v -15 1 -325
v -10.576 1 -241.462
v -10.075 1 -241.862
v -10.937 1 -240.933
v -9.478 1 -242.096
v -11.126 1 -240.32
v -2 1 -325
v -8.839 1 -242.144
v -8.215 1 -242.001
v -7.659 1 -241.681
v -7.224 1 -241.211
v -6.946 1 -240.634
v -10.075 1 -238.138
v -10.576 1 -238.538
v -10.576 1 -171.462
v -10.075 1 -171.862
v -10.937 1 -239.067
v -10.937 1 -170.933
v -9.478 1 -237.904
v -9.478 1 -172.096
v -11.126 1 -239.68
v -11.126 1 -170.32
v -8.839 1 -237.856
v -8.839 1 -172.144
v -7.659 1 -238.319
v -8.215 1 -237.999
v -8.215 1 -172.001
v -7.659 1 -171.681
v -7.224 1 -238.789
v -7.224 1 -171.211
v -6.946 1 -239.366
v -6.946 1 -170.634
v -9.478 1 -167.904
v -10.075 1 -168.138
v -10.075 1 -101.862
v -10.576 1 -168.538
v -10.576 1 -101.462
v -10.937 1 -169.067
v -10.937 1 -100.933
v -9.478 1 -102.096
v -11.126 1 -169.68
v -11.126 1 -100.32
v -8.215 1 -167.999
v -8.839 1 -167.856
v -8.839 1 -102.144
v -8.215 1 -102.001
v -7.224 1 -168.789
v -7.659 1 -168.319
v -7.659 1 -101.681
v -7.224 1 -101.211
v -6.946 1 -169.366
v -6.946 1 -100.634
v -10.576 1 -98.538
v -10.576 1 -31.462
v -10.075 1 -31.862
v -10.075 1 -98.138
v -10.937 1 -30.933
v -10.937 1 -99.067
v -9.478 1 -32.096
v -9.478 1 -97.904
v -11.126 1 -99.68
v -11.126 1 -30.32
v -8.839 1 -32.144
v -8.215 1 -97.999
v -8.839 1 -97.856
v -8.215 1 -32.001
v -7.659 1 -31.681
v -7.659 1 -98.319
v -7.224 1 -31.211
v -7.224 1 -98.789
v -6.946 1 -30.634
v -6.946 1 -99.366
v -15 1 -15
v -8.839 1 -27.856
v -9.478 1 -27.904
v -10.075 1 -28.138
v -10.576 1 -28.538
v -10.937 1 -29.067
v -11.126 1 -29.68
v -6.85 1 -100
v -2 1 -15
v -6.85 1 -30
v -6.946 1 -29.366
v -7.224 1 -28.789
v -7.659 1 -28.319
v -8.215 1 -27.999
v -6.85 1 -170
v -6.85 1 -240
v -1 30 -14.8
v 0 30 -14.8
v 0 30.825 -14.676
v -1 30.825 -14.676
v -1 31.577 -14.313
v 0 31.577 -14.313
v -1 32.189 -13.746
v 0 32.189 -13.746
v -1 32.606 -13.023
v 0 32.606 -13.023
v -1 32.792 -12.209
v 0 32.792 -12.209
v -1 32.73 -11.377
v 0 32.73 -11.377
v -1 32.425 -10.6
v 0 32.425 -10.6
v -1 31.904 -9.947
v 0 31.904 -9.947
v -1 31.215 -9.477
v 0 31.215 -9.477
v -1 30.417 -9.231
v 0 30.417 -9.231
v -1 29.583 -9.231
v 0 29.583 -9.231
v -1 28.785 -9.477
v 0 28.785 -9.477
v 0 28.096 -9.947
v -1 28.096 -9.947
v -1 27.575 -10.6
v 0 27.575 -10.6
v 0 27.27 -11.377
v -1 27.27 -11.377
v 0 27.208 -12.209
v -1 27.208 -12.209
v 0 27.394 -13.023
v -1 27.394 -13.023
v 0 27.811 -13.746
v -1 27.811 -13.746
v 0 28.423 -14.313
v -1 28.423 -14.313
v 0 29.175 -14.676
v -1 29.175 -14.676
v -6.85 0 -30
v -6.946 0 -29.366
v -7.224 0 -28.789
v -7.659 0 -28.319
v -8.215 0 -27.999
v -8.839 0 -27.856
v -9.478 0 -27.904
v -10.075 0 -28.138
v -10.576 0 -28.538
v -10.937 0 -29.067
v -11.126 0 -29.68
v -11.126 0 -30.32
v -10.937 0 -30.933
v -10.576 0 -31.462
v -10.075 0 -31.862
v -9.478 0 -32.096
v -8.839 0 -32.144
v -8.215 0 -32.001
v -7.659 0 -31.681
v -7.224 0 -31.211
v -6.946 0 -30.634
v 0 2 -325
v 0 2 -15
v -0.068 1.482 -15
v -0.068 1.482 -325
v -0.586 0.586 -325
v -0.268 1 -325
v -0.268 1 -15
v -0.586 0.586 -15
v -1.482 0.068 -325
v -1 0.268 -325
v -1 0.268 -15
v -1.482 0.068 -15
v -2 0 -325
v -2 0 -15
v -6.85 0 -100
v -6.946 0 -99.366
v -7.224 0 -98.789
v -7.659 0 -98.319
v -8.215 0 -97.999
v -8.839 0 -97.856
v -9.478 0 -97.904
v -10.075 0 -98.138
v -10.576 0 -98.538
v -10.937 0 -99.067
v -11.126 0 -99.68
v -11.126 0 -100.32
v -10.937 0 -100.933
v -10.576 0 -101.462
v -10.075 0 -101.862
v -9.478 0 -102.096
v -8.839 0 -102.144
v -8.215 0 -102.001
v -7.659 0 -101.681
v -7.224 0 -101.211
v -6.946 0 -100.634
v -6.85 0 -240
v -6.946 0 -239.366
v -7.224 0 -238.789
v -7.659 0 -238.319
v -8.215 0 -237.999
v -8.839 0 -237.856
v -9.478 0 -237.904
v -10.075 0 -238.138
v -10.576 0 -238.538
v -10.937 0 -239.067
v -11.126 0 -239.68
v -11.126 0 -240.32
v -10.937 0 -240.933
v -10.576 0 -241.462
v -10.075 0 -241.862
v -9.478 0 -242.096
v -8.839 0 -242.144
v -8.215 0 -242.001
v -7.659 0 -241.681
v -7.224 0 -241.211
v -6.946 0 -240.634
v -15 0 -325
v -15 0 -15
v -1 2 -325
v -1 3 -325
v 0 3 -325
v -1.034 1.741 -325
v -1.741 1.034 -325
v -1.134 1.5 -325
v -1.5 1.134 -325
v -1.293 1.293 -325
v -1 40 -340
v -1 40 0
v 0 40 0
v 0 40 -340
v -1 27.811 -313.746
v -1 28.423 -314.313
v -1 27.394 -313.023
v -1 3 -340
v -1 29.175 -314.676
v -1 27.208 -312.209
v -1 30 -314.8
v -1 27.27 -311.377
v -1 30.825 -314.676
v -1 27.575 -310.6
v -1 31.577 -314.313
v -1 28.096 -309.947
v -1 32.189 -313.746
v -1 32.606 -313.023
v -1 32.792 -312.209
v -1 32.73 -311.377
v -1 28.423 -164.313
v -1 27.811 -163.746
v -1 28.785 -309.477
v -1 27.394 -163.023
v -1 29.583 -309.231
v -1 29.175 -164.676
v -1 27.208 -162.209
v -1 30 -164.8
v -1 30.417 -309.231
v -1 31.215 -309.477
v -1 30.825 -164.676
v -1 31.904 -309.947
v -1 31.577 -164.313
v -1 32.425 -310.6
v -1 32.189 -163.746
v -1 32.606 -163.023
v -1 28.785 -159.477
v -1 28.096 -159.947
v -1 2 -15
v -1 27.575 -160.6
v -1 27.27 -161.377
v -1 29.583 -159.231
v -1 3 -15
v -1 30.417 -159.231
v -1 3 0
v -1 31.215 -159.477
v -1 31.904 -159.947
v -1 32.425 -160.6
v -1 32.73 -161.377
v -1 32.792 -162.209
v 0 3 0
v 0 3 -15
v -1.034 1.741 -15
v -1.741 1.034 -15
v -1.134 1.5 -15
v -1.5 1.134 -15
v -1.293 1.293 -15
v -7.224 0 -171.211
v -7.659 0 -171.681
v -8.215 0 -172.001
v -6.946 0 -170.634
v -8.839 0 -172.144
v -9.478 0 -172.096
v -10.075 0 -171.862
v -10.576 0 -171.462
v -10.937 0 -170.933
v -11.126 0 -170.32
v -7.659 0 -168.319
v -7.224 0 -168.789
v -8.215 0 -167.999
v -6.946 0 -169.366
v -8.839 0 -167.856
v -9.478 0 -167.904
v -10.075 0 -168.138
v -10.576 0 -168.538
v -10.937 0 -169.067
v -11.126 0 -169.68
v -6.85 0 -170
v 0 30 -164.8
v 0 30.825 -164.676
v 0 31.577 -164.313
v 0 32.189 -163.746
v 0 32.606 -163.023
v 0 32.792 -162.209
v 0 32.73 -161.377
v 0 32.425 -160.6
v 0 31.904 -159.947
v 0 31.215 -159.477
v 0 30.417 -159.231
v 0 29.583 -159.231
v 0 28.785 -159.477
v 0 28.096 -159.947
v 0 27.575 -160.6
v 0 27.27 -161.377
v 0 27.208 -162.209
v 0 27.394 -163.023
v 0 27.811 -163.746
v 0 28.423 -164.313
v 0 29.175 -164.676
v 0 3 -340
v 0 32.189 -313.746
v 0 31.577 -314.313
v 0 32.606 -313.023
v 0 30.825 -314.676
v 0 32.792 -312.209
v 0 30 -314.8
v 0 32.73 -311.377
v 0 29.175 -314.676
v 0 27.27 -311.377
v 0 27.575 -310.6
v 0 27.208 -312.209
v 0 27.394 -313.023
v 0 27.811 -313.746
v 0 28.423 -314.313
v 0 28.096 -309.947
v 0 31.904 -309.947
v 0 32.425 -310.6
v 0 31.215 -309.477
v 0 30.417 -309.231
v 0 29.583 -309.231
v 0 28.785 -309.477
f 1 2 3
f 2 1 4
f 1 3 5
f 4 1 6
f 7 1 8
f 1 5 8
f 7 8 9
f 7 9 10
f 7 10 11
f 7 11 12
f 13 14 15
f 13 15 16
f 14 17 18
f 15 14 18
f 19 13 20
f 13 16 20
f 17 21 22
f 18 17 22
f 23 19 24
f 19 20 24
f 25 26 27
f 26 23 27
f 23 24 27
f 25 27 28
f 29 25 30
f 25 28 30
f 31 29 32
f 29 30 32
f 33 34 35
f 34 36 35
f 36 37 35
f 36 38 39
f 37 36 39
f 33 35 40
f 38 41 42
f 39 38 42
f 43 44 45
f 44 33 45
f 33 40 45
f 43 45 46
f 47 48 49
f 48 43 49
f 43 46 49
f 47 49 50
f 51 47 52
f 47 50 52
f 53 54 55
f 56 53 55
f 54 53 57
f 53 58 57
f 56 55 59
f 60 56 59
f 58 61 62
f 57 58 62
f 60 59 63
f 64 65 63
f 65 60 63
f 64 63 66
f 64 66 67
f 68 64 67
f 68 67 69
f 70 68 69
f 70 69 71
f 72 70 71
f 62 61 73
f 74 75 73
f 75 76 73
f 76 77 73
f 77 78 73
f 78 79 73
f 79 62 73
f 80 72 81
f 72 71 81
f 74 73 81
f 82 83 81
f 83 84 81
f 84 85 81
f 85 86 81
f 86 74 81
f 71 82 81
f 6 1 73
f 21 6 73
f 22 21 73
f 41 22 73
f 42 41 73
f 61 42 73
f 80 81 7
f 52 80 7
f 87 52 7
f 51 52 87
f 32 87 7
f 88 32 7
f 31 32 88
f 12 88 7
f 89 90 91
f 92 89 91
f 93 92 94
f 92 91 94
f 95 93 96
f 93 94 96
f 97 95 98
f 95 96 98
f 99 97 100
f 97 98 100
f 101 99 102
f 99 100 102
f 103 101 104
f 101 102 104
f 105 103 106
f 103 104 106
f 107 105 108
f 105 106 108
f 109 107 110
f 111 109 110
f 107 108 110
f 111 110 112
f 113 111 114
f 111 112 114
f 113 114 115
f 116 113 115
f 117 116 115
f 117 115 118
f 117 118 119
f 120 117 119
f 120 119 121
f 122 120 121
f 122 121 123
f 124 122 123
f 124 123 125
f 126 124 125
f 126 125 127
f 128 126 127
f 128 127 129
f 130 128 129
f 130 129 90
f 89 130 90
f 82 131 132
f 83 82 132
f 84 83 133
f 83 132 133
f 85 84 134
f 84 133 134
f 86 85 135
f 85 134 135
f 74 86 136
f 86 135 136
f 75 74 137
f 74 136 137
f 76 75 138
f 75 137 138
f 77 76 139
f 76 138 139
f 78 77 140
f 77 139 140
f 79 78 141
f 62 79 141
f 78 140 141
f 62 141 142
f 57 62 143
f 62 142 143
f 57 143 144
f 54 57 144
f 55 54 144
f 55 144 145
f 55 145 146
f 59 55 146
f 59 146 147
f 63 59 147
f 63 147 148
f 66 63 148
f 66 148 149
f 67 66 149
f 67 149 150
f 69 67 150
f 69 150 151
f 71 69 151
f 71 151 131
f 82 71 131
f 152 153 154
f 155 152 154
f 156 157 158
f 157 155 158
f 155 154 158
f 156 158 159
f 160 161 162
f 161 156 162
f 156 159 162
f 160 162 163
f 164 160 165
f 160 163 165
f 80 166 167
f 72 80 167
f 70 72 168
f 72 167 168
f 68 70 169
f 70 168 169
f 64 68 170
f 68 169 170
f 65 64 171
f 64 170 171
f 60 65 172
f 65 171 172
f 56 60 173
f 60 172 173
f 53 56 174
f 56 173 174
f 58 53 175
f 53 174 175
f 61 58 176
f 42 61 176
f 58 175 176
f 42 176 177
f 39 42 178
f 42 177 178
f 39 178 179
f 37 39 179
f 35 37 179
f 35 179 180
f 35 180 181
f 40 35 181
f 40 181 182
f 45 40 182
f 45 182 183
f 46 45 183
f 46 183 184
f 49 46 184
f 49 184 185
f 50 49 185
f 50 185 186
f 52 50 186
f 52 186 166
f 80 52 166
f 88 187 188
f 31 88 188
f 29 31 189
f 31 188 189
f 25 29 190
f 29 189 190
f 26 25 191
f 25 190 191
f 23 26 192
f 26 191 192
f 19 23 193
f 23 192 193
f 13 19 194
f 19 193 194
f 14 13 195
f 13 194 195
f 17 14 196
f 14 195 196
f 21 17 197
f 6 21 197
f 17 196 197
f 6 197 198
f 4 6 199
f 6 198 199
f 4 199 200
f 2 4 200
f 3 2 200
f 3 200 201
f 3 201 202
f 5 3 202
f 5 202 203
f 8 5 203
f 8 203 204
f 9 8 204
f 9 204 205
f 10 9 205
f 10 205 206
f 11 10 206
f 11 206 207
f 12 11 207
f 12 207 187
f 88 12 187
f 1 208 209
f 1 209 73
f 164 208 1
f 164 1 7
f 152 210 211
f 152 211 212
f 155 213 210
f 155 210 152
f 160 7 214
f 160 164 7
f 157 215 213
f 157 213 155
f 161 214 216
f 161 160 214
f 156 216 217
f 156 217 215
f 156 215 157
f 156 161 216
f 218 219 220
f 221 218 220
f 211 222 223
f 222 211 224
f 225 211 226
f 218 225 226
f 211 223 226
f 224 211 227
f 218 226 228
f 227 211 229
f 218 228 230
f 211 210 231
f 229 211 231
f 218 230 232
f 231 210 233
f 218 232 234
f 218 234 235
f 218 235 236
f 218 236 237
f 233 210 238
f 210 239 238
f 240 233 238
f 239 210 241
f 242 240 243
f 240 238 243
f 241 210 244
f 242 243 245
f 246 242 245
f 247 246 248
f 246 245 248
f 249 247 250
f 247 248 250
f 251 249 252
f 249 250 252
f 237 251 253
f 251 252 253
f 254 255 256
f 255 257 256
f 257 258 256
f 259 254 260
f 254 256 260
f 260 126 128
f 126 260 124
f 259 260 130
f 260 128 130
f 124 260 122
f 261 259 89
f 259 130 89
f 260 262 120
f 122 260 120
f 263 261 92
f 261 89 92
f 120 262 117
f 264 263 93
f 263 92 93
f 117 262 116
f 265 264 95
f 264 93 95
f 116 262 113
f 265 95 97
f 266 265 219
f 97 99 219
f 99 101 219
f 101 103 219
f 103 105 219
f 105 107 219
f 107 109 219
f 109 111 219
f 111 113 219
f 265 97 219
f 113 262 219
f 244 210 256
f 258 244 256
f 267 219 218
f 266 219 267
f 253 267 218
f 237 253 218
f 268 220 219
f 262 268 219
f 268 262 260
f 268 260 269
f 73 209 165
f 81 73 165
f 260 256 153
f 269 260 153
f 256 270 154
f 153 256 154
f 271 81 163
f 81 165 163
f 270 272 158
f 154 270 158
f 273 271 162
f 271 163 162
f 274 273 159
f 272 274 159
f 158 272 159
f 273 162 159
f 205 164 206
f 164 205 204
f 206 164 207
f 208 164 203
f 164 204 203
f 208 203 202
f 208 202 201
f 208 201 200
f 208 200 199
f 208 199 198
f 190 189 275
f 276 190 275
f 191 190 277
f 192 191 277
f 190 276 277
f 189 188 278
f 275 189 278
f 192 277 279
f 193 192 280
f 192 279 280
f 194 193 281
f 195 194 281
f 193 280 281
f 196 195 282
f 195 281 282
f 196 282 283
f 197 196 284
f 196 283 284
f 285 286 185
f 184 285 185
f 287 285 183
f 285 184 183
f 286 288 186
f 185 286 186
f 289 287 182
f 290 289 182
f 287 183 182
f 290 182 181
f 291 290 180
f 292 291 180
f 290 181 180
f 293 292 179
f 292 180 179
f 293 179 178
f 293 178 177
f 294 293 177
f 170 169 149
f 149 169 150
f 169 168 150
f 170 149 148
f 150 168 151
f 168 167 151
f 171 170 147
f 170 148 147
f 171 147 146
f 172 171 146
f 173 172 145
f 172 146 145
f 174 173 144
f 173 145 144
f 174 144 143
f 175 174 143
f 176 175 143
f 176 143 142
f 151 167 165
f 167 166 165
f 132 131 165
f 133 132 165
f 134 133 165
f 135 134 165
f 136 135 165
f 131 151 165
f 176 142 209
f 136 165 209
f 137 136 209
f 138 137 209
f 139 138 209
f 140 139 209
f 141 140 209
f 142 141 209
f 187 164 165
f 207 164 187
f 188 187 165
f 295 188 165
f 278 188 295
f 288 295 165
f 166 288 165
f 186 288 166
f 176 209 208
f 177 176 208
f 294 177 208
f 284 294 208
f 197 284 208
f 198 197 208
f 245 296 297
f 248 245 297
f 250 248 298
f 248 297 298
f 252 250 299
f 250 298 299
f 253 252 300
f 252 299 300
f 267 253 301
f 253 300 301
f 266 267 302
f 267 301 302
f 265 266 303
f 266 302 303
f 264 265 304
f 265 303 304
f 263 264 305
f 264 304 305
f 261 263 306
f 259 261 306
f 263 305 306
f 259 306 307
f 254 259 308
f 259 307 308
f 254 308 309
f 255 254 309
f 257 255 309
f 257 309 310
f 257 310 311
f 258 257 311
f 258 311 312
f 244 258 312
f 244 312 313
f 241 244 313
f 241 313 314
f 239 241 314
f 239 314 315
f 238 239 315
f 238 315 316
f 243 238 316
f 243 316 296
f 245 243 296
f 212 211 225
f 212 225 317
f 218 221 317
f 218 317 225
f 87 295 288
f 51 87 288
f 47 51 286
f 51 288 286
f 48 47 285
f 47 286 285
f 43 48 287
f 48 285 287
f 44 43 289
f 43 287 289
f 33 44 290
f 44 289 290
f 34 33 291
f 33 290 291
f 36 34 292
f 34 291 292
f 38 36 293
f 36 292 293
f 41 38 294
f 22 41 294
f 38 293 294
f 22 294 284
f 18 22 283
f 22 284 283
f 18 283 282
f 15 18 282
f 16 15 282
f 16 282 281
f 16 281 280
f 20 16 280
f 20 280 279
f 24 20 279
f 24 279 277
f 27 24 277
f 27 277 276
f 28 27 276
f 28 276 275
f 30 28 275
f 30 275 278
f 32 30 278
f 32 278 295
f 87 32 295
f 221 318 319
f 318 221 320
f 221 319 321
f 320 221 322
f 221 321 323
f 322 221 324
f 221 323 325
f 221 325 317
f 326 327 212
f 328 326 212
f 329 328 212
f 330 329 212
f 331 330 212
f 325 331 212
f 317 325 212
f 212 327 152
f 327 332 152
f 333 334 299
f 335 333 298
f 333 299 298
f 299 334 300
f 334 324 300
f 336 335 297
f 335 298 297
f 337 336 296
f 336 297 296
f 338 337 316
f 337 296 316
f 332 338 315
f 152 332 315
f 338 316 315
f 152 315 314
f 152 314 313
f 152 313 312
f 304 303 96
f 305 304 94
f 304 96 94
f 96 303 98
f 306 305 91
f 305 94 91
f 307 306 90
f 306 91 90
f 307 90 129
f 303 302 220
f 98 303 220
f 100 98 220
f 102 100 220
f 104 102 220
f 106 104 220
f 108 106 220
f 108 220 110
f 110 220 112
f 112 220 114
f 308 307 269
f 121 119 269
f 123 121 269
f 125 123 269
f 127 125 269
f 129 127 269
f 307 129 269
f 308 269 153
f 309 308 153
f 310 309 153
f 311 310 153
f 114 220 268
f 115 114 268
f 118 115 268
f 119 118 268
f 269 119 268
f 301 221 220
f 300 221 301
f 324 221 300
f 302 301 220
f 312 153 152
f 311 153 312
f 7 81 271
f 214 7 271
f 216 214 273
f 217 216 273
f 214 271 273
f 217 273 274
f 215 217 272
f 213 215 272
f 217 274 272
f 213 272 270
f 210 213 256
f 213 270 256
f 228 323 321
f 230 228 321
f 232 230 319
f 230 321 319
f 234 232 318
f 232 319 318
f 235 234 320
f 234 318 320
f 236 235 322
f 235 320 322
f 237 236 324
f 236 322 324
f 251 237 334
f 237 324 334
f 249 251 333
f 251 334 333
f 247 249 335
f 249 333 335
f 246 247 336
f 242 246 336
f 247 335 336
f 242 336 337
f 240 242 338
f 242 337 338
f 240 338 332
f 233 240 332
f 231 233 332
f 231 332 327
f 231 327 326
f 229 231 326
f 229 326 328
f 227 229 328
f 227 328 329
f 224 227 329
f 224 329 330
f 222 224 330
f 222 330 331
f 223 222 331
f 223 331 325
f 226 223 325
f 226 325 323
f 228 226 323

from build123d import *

# Parameters (mm, degrees)
EXTRUDE_1_DEPTH     = 340
SKETCH_2_R          = 2.8
CUT_EXTRUDE_1_DEPTH = 340
SKETCH_3_R          = 2.15
CUT_EXTRUDE_2_DEPTH = 340
SKETCH_4_W          = 37.623292197
SKETCH_4_H          = 20.655925128
SKETCH_4_W_2        = 42.547460075
SKETCH_4_H_2        = 15
SKETCH_4_W_3        = 34.50961452
CUT_EXTRUDE_3_DEPTH = 3


with BuildPart() as part:
    # Эскиз1 → Вытянуть1 (new body)
    with BuildSketch(Plane.XY):
        with BuildLine():
            Line((-2, 0), (-15, 0))
            Line((-15, 0), (-15, 1))
            Line((-15, 1), (-2, 1))
            ThreePointArc((-2, 1), (-1.292893219, 1.292893219), (-1, 2))
            Line((-1, 2), (-1, 40))
            Line((-1, 40), (0, 40))
            Line((0, 40), (0, 2))
            ThreePointArc((0, 2), (-0.585786438, 0.585786438), (-2, 0))
        make_face()
    extrude(amount=-EXTRUDE_1_DEPTH)

    # Эскиз2 → Вырез-Вытянуть1 (cut)
    with BuildSketch(Plane(origin=(0, 0, 0), x_dir=(0, 0, -1), z_dir=(1, 0, 0))):
        with Locations((12, 30)):
            Circle(SKETCH_2_R)
        with Locations((162, 30)):
            Circle(SKETCH_2_R)
        with Locations((312, 30)):
            Circle(SKETCH_2_R)
    extrude(amount=-CUT_EXTRUDE_1_DEPTH, mode=Mode.SUBTRACT)

    # Эскиз3 → Вырез-Вытянуть2 (cut)
    with BuildSketch(Plane.XZ):
        with Locations((-9, -240)):
            Circle(SKETCH_3_R)
        with Locations((-9, -170)):
            Circle(SKETCH_3_R)
        with Locations((-9, -100)):
            Circle(SKETCH_3_R)
        with Locations((-9, -30)):
            Circle(SKETCH_3_R)
    extrude(amount=-CUT_EXTRUDE_2_DEPTH, mode=Mode.SUBTRACT)

    # Эскиз4 → Вырез-Вытянуть3 (cut)
    with BuildSketch(Plane.XZ):
        with Locations((6.462024168, 335.327962564)):
            Rectangle(SKETCH_4_W, SKETCH_4_H)
        with Locations((3.999940229, -7.5)):
            Rectangle(SKETCH_4_W_2, SKETCH_4_H_2)
        with Locations((2.25480726, -332.5)):
            Rectangle(SKETCH_4_W_3, SKETCH_4_H_2)
    extrude(amount=-CUT_EXTRUDE_3_DEPTH, mode=Mode.SUBTRACT)


solid = part.part
